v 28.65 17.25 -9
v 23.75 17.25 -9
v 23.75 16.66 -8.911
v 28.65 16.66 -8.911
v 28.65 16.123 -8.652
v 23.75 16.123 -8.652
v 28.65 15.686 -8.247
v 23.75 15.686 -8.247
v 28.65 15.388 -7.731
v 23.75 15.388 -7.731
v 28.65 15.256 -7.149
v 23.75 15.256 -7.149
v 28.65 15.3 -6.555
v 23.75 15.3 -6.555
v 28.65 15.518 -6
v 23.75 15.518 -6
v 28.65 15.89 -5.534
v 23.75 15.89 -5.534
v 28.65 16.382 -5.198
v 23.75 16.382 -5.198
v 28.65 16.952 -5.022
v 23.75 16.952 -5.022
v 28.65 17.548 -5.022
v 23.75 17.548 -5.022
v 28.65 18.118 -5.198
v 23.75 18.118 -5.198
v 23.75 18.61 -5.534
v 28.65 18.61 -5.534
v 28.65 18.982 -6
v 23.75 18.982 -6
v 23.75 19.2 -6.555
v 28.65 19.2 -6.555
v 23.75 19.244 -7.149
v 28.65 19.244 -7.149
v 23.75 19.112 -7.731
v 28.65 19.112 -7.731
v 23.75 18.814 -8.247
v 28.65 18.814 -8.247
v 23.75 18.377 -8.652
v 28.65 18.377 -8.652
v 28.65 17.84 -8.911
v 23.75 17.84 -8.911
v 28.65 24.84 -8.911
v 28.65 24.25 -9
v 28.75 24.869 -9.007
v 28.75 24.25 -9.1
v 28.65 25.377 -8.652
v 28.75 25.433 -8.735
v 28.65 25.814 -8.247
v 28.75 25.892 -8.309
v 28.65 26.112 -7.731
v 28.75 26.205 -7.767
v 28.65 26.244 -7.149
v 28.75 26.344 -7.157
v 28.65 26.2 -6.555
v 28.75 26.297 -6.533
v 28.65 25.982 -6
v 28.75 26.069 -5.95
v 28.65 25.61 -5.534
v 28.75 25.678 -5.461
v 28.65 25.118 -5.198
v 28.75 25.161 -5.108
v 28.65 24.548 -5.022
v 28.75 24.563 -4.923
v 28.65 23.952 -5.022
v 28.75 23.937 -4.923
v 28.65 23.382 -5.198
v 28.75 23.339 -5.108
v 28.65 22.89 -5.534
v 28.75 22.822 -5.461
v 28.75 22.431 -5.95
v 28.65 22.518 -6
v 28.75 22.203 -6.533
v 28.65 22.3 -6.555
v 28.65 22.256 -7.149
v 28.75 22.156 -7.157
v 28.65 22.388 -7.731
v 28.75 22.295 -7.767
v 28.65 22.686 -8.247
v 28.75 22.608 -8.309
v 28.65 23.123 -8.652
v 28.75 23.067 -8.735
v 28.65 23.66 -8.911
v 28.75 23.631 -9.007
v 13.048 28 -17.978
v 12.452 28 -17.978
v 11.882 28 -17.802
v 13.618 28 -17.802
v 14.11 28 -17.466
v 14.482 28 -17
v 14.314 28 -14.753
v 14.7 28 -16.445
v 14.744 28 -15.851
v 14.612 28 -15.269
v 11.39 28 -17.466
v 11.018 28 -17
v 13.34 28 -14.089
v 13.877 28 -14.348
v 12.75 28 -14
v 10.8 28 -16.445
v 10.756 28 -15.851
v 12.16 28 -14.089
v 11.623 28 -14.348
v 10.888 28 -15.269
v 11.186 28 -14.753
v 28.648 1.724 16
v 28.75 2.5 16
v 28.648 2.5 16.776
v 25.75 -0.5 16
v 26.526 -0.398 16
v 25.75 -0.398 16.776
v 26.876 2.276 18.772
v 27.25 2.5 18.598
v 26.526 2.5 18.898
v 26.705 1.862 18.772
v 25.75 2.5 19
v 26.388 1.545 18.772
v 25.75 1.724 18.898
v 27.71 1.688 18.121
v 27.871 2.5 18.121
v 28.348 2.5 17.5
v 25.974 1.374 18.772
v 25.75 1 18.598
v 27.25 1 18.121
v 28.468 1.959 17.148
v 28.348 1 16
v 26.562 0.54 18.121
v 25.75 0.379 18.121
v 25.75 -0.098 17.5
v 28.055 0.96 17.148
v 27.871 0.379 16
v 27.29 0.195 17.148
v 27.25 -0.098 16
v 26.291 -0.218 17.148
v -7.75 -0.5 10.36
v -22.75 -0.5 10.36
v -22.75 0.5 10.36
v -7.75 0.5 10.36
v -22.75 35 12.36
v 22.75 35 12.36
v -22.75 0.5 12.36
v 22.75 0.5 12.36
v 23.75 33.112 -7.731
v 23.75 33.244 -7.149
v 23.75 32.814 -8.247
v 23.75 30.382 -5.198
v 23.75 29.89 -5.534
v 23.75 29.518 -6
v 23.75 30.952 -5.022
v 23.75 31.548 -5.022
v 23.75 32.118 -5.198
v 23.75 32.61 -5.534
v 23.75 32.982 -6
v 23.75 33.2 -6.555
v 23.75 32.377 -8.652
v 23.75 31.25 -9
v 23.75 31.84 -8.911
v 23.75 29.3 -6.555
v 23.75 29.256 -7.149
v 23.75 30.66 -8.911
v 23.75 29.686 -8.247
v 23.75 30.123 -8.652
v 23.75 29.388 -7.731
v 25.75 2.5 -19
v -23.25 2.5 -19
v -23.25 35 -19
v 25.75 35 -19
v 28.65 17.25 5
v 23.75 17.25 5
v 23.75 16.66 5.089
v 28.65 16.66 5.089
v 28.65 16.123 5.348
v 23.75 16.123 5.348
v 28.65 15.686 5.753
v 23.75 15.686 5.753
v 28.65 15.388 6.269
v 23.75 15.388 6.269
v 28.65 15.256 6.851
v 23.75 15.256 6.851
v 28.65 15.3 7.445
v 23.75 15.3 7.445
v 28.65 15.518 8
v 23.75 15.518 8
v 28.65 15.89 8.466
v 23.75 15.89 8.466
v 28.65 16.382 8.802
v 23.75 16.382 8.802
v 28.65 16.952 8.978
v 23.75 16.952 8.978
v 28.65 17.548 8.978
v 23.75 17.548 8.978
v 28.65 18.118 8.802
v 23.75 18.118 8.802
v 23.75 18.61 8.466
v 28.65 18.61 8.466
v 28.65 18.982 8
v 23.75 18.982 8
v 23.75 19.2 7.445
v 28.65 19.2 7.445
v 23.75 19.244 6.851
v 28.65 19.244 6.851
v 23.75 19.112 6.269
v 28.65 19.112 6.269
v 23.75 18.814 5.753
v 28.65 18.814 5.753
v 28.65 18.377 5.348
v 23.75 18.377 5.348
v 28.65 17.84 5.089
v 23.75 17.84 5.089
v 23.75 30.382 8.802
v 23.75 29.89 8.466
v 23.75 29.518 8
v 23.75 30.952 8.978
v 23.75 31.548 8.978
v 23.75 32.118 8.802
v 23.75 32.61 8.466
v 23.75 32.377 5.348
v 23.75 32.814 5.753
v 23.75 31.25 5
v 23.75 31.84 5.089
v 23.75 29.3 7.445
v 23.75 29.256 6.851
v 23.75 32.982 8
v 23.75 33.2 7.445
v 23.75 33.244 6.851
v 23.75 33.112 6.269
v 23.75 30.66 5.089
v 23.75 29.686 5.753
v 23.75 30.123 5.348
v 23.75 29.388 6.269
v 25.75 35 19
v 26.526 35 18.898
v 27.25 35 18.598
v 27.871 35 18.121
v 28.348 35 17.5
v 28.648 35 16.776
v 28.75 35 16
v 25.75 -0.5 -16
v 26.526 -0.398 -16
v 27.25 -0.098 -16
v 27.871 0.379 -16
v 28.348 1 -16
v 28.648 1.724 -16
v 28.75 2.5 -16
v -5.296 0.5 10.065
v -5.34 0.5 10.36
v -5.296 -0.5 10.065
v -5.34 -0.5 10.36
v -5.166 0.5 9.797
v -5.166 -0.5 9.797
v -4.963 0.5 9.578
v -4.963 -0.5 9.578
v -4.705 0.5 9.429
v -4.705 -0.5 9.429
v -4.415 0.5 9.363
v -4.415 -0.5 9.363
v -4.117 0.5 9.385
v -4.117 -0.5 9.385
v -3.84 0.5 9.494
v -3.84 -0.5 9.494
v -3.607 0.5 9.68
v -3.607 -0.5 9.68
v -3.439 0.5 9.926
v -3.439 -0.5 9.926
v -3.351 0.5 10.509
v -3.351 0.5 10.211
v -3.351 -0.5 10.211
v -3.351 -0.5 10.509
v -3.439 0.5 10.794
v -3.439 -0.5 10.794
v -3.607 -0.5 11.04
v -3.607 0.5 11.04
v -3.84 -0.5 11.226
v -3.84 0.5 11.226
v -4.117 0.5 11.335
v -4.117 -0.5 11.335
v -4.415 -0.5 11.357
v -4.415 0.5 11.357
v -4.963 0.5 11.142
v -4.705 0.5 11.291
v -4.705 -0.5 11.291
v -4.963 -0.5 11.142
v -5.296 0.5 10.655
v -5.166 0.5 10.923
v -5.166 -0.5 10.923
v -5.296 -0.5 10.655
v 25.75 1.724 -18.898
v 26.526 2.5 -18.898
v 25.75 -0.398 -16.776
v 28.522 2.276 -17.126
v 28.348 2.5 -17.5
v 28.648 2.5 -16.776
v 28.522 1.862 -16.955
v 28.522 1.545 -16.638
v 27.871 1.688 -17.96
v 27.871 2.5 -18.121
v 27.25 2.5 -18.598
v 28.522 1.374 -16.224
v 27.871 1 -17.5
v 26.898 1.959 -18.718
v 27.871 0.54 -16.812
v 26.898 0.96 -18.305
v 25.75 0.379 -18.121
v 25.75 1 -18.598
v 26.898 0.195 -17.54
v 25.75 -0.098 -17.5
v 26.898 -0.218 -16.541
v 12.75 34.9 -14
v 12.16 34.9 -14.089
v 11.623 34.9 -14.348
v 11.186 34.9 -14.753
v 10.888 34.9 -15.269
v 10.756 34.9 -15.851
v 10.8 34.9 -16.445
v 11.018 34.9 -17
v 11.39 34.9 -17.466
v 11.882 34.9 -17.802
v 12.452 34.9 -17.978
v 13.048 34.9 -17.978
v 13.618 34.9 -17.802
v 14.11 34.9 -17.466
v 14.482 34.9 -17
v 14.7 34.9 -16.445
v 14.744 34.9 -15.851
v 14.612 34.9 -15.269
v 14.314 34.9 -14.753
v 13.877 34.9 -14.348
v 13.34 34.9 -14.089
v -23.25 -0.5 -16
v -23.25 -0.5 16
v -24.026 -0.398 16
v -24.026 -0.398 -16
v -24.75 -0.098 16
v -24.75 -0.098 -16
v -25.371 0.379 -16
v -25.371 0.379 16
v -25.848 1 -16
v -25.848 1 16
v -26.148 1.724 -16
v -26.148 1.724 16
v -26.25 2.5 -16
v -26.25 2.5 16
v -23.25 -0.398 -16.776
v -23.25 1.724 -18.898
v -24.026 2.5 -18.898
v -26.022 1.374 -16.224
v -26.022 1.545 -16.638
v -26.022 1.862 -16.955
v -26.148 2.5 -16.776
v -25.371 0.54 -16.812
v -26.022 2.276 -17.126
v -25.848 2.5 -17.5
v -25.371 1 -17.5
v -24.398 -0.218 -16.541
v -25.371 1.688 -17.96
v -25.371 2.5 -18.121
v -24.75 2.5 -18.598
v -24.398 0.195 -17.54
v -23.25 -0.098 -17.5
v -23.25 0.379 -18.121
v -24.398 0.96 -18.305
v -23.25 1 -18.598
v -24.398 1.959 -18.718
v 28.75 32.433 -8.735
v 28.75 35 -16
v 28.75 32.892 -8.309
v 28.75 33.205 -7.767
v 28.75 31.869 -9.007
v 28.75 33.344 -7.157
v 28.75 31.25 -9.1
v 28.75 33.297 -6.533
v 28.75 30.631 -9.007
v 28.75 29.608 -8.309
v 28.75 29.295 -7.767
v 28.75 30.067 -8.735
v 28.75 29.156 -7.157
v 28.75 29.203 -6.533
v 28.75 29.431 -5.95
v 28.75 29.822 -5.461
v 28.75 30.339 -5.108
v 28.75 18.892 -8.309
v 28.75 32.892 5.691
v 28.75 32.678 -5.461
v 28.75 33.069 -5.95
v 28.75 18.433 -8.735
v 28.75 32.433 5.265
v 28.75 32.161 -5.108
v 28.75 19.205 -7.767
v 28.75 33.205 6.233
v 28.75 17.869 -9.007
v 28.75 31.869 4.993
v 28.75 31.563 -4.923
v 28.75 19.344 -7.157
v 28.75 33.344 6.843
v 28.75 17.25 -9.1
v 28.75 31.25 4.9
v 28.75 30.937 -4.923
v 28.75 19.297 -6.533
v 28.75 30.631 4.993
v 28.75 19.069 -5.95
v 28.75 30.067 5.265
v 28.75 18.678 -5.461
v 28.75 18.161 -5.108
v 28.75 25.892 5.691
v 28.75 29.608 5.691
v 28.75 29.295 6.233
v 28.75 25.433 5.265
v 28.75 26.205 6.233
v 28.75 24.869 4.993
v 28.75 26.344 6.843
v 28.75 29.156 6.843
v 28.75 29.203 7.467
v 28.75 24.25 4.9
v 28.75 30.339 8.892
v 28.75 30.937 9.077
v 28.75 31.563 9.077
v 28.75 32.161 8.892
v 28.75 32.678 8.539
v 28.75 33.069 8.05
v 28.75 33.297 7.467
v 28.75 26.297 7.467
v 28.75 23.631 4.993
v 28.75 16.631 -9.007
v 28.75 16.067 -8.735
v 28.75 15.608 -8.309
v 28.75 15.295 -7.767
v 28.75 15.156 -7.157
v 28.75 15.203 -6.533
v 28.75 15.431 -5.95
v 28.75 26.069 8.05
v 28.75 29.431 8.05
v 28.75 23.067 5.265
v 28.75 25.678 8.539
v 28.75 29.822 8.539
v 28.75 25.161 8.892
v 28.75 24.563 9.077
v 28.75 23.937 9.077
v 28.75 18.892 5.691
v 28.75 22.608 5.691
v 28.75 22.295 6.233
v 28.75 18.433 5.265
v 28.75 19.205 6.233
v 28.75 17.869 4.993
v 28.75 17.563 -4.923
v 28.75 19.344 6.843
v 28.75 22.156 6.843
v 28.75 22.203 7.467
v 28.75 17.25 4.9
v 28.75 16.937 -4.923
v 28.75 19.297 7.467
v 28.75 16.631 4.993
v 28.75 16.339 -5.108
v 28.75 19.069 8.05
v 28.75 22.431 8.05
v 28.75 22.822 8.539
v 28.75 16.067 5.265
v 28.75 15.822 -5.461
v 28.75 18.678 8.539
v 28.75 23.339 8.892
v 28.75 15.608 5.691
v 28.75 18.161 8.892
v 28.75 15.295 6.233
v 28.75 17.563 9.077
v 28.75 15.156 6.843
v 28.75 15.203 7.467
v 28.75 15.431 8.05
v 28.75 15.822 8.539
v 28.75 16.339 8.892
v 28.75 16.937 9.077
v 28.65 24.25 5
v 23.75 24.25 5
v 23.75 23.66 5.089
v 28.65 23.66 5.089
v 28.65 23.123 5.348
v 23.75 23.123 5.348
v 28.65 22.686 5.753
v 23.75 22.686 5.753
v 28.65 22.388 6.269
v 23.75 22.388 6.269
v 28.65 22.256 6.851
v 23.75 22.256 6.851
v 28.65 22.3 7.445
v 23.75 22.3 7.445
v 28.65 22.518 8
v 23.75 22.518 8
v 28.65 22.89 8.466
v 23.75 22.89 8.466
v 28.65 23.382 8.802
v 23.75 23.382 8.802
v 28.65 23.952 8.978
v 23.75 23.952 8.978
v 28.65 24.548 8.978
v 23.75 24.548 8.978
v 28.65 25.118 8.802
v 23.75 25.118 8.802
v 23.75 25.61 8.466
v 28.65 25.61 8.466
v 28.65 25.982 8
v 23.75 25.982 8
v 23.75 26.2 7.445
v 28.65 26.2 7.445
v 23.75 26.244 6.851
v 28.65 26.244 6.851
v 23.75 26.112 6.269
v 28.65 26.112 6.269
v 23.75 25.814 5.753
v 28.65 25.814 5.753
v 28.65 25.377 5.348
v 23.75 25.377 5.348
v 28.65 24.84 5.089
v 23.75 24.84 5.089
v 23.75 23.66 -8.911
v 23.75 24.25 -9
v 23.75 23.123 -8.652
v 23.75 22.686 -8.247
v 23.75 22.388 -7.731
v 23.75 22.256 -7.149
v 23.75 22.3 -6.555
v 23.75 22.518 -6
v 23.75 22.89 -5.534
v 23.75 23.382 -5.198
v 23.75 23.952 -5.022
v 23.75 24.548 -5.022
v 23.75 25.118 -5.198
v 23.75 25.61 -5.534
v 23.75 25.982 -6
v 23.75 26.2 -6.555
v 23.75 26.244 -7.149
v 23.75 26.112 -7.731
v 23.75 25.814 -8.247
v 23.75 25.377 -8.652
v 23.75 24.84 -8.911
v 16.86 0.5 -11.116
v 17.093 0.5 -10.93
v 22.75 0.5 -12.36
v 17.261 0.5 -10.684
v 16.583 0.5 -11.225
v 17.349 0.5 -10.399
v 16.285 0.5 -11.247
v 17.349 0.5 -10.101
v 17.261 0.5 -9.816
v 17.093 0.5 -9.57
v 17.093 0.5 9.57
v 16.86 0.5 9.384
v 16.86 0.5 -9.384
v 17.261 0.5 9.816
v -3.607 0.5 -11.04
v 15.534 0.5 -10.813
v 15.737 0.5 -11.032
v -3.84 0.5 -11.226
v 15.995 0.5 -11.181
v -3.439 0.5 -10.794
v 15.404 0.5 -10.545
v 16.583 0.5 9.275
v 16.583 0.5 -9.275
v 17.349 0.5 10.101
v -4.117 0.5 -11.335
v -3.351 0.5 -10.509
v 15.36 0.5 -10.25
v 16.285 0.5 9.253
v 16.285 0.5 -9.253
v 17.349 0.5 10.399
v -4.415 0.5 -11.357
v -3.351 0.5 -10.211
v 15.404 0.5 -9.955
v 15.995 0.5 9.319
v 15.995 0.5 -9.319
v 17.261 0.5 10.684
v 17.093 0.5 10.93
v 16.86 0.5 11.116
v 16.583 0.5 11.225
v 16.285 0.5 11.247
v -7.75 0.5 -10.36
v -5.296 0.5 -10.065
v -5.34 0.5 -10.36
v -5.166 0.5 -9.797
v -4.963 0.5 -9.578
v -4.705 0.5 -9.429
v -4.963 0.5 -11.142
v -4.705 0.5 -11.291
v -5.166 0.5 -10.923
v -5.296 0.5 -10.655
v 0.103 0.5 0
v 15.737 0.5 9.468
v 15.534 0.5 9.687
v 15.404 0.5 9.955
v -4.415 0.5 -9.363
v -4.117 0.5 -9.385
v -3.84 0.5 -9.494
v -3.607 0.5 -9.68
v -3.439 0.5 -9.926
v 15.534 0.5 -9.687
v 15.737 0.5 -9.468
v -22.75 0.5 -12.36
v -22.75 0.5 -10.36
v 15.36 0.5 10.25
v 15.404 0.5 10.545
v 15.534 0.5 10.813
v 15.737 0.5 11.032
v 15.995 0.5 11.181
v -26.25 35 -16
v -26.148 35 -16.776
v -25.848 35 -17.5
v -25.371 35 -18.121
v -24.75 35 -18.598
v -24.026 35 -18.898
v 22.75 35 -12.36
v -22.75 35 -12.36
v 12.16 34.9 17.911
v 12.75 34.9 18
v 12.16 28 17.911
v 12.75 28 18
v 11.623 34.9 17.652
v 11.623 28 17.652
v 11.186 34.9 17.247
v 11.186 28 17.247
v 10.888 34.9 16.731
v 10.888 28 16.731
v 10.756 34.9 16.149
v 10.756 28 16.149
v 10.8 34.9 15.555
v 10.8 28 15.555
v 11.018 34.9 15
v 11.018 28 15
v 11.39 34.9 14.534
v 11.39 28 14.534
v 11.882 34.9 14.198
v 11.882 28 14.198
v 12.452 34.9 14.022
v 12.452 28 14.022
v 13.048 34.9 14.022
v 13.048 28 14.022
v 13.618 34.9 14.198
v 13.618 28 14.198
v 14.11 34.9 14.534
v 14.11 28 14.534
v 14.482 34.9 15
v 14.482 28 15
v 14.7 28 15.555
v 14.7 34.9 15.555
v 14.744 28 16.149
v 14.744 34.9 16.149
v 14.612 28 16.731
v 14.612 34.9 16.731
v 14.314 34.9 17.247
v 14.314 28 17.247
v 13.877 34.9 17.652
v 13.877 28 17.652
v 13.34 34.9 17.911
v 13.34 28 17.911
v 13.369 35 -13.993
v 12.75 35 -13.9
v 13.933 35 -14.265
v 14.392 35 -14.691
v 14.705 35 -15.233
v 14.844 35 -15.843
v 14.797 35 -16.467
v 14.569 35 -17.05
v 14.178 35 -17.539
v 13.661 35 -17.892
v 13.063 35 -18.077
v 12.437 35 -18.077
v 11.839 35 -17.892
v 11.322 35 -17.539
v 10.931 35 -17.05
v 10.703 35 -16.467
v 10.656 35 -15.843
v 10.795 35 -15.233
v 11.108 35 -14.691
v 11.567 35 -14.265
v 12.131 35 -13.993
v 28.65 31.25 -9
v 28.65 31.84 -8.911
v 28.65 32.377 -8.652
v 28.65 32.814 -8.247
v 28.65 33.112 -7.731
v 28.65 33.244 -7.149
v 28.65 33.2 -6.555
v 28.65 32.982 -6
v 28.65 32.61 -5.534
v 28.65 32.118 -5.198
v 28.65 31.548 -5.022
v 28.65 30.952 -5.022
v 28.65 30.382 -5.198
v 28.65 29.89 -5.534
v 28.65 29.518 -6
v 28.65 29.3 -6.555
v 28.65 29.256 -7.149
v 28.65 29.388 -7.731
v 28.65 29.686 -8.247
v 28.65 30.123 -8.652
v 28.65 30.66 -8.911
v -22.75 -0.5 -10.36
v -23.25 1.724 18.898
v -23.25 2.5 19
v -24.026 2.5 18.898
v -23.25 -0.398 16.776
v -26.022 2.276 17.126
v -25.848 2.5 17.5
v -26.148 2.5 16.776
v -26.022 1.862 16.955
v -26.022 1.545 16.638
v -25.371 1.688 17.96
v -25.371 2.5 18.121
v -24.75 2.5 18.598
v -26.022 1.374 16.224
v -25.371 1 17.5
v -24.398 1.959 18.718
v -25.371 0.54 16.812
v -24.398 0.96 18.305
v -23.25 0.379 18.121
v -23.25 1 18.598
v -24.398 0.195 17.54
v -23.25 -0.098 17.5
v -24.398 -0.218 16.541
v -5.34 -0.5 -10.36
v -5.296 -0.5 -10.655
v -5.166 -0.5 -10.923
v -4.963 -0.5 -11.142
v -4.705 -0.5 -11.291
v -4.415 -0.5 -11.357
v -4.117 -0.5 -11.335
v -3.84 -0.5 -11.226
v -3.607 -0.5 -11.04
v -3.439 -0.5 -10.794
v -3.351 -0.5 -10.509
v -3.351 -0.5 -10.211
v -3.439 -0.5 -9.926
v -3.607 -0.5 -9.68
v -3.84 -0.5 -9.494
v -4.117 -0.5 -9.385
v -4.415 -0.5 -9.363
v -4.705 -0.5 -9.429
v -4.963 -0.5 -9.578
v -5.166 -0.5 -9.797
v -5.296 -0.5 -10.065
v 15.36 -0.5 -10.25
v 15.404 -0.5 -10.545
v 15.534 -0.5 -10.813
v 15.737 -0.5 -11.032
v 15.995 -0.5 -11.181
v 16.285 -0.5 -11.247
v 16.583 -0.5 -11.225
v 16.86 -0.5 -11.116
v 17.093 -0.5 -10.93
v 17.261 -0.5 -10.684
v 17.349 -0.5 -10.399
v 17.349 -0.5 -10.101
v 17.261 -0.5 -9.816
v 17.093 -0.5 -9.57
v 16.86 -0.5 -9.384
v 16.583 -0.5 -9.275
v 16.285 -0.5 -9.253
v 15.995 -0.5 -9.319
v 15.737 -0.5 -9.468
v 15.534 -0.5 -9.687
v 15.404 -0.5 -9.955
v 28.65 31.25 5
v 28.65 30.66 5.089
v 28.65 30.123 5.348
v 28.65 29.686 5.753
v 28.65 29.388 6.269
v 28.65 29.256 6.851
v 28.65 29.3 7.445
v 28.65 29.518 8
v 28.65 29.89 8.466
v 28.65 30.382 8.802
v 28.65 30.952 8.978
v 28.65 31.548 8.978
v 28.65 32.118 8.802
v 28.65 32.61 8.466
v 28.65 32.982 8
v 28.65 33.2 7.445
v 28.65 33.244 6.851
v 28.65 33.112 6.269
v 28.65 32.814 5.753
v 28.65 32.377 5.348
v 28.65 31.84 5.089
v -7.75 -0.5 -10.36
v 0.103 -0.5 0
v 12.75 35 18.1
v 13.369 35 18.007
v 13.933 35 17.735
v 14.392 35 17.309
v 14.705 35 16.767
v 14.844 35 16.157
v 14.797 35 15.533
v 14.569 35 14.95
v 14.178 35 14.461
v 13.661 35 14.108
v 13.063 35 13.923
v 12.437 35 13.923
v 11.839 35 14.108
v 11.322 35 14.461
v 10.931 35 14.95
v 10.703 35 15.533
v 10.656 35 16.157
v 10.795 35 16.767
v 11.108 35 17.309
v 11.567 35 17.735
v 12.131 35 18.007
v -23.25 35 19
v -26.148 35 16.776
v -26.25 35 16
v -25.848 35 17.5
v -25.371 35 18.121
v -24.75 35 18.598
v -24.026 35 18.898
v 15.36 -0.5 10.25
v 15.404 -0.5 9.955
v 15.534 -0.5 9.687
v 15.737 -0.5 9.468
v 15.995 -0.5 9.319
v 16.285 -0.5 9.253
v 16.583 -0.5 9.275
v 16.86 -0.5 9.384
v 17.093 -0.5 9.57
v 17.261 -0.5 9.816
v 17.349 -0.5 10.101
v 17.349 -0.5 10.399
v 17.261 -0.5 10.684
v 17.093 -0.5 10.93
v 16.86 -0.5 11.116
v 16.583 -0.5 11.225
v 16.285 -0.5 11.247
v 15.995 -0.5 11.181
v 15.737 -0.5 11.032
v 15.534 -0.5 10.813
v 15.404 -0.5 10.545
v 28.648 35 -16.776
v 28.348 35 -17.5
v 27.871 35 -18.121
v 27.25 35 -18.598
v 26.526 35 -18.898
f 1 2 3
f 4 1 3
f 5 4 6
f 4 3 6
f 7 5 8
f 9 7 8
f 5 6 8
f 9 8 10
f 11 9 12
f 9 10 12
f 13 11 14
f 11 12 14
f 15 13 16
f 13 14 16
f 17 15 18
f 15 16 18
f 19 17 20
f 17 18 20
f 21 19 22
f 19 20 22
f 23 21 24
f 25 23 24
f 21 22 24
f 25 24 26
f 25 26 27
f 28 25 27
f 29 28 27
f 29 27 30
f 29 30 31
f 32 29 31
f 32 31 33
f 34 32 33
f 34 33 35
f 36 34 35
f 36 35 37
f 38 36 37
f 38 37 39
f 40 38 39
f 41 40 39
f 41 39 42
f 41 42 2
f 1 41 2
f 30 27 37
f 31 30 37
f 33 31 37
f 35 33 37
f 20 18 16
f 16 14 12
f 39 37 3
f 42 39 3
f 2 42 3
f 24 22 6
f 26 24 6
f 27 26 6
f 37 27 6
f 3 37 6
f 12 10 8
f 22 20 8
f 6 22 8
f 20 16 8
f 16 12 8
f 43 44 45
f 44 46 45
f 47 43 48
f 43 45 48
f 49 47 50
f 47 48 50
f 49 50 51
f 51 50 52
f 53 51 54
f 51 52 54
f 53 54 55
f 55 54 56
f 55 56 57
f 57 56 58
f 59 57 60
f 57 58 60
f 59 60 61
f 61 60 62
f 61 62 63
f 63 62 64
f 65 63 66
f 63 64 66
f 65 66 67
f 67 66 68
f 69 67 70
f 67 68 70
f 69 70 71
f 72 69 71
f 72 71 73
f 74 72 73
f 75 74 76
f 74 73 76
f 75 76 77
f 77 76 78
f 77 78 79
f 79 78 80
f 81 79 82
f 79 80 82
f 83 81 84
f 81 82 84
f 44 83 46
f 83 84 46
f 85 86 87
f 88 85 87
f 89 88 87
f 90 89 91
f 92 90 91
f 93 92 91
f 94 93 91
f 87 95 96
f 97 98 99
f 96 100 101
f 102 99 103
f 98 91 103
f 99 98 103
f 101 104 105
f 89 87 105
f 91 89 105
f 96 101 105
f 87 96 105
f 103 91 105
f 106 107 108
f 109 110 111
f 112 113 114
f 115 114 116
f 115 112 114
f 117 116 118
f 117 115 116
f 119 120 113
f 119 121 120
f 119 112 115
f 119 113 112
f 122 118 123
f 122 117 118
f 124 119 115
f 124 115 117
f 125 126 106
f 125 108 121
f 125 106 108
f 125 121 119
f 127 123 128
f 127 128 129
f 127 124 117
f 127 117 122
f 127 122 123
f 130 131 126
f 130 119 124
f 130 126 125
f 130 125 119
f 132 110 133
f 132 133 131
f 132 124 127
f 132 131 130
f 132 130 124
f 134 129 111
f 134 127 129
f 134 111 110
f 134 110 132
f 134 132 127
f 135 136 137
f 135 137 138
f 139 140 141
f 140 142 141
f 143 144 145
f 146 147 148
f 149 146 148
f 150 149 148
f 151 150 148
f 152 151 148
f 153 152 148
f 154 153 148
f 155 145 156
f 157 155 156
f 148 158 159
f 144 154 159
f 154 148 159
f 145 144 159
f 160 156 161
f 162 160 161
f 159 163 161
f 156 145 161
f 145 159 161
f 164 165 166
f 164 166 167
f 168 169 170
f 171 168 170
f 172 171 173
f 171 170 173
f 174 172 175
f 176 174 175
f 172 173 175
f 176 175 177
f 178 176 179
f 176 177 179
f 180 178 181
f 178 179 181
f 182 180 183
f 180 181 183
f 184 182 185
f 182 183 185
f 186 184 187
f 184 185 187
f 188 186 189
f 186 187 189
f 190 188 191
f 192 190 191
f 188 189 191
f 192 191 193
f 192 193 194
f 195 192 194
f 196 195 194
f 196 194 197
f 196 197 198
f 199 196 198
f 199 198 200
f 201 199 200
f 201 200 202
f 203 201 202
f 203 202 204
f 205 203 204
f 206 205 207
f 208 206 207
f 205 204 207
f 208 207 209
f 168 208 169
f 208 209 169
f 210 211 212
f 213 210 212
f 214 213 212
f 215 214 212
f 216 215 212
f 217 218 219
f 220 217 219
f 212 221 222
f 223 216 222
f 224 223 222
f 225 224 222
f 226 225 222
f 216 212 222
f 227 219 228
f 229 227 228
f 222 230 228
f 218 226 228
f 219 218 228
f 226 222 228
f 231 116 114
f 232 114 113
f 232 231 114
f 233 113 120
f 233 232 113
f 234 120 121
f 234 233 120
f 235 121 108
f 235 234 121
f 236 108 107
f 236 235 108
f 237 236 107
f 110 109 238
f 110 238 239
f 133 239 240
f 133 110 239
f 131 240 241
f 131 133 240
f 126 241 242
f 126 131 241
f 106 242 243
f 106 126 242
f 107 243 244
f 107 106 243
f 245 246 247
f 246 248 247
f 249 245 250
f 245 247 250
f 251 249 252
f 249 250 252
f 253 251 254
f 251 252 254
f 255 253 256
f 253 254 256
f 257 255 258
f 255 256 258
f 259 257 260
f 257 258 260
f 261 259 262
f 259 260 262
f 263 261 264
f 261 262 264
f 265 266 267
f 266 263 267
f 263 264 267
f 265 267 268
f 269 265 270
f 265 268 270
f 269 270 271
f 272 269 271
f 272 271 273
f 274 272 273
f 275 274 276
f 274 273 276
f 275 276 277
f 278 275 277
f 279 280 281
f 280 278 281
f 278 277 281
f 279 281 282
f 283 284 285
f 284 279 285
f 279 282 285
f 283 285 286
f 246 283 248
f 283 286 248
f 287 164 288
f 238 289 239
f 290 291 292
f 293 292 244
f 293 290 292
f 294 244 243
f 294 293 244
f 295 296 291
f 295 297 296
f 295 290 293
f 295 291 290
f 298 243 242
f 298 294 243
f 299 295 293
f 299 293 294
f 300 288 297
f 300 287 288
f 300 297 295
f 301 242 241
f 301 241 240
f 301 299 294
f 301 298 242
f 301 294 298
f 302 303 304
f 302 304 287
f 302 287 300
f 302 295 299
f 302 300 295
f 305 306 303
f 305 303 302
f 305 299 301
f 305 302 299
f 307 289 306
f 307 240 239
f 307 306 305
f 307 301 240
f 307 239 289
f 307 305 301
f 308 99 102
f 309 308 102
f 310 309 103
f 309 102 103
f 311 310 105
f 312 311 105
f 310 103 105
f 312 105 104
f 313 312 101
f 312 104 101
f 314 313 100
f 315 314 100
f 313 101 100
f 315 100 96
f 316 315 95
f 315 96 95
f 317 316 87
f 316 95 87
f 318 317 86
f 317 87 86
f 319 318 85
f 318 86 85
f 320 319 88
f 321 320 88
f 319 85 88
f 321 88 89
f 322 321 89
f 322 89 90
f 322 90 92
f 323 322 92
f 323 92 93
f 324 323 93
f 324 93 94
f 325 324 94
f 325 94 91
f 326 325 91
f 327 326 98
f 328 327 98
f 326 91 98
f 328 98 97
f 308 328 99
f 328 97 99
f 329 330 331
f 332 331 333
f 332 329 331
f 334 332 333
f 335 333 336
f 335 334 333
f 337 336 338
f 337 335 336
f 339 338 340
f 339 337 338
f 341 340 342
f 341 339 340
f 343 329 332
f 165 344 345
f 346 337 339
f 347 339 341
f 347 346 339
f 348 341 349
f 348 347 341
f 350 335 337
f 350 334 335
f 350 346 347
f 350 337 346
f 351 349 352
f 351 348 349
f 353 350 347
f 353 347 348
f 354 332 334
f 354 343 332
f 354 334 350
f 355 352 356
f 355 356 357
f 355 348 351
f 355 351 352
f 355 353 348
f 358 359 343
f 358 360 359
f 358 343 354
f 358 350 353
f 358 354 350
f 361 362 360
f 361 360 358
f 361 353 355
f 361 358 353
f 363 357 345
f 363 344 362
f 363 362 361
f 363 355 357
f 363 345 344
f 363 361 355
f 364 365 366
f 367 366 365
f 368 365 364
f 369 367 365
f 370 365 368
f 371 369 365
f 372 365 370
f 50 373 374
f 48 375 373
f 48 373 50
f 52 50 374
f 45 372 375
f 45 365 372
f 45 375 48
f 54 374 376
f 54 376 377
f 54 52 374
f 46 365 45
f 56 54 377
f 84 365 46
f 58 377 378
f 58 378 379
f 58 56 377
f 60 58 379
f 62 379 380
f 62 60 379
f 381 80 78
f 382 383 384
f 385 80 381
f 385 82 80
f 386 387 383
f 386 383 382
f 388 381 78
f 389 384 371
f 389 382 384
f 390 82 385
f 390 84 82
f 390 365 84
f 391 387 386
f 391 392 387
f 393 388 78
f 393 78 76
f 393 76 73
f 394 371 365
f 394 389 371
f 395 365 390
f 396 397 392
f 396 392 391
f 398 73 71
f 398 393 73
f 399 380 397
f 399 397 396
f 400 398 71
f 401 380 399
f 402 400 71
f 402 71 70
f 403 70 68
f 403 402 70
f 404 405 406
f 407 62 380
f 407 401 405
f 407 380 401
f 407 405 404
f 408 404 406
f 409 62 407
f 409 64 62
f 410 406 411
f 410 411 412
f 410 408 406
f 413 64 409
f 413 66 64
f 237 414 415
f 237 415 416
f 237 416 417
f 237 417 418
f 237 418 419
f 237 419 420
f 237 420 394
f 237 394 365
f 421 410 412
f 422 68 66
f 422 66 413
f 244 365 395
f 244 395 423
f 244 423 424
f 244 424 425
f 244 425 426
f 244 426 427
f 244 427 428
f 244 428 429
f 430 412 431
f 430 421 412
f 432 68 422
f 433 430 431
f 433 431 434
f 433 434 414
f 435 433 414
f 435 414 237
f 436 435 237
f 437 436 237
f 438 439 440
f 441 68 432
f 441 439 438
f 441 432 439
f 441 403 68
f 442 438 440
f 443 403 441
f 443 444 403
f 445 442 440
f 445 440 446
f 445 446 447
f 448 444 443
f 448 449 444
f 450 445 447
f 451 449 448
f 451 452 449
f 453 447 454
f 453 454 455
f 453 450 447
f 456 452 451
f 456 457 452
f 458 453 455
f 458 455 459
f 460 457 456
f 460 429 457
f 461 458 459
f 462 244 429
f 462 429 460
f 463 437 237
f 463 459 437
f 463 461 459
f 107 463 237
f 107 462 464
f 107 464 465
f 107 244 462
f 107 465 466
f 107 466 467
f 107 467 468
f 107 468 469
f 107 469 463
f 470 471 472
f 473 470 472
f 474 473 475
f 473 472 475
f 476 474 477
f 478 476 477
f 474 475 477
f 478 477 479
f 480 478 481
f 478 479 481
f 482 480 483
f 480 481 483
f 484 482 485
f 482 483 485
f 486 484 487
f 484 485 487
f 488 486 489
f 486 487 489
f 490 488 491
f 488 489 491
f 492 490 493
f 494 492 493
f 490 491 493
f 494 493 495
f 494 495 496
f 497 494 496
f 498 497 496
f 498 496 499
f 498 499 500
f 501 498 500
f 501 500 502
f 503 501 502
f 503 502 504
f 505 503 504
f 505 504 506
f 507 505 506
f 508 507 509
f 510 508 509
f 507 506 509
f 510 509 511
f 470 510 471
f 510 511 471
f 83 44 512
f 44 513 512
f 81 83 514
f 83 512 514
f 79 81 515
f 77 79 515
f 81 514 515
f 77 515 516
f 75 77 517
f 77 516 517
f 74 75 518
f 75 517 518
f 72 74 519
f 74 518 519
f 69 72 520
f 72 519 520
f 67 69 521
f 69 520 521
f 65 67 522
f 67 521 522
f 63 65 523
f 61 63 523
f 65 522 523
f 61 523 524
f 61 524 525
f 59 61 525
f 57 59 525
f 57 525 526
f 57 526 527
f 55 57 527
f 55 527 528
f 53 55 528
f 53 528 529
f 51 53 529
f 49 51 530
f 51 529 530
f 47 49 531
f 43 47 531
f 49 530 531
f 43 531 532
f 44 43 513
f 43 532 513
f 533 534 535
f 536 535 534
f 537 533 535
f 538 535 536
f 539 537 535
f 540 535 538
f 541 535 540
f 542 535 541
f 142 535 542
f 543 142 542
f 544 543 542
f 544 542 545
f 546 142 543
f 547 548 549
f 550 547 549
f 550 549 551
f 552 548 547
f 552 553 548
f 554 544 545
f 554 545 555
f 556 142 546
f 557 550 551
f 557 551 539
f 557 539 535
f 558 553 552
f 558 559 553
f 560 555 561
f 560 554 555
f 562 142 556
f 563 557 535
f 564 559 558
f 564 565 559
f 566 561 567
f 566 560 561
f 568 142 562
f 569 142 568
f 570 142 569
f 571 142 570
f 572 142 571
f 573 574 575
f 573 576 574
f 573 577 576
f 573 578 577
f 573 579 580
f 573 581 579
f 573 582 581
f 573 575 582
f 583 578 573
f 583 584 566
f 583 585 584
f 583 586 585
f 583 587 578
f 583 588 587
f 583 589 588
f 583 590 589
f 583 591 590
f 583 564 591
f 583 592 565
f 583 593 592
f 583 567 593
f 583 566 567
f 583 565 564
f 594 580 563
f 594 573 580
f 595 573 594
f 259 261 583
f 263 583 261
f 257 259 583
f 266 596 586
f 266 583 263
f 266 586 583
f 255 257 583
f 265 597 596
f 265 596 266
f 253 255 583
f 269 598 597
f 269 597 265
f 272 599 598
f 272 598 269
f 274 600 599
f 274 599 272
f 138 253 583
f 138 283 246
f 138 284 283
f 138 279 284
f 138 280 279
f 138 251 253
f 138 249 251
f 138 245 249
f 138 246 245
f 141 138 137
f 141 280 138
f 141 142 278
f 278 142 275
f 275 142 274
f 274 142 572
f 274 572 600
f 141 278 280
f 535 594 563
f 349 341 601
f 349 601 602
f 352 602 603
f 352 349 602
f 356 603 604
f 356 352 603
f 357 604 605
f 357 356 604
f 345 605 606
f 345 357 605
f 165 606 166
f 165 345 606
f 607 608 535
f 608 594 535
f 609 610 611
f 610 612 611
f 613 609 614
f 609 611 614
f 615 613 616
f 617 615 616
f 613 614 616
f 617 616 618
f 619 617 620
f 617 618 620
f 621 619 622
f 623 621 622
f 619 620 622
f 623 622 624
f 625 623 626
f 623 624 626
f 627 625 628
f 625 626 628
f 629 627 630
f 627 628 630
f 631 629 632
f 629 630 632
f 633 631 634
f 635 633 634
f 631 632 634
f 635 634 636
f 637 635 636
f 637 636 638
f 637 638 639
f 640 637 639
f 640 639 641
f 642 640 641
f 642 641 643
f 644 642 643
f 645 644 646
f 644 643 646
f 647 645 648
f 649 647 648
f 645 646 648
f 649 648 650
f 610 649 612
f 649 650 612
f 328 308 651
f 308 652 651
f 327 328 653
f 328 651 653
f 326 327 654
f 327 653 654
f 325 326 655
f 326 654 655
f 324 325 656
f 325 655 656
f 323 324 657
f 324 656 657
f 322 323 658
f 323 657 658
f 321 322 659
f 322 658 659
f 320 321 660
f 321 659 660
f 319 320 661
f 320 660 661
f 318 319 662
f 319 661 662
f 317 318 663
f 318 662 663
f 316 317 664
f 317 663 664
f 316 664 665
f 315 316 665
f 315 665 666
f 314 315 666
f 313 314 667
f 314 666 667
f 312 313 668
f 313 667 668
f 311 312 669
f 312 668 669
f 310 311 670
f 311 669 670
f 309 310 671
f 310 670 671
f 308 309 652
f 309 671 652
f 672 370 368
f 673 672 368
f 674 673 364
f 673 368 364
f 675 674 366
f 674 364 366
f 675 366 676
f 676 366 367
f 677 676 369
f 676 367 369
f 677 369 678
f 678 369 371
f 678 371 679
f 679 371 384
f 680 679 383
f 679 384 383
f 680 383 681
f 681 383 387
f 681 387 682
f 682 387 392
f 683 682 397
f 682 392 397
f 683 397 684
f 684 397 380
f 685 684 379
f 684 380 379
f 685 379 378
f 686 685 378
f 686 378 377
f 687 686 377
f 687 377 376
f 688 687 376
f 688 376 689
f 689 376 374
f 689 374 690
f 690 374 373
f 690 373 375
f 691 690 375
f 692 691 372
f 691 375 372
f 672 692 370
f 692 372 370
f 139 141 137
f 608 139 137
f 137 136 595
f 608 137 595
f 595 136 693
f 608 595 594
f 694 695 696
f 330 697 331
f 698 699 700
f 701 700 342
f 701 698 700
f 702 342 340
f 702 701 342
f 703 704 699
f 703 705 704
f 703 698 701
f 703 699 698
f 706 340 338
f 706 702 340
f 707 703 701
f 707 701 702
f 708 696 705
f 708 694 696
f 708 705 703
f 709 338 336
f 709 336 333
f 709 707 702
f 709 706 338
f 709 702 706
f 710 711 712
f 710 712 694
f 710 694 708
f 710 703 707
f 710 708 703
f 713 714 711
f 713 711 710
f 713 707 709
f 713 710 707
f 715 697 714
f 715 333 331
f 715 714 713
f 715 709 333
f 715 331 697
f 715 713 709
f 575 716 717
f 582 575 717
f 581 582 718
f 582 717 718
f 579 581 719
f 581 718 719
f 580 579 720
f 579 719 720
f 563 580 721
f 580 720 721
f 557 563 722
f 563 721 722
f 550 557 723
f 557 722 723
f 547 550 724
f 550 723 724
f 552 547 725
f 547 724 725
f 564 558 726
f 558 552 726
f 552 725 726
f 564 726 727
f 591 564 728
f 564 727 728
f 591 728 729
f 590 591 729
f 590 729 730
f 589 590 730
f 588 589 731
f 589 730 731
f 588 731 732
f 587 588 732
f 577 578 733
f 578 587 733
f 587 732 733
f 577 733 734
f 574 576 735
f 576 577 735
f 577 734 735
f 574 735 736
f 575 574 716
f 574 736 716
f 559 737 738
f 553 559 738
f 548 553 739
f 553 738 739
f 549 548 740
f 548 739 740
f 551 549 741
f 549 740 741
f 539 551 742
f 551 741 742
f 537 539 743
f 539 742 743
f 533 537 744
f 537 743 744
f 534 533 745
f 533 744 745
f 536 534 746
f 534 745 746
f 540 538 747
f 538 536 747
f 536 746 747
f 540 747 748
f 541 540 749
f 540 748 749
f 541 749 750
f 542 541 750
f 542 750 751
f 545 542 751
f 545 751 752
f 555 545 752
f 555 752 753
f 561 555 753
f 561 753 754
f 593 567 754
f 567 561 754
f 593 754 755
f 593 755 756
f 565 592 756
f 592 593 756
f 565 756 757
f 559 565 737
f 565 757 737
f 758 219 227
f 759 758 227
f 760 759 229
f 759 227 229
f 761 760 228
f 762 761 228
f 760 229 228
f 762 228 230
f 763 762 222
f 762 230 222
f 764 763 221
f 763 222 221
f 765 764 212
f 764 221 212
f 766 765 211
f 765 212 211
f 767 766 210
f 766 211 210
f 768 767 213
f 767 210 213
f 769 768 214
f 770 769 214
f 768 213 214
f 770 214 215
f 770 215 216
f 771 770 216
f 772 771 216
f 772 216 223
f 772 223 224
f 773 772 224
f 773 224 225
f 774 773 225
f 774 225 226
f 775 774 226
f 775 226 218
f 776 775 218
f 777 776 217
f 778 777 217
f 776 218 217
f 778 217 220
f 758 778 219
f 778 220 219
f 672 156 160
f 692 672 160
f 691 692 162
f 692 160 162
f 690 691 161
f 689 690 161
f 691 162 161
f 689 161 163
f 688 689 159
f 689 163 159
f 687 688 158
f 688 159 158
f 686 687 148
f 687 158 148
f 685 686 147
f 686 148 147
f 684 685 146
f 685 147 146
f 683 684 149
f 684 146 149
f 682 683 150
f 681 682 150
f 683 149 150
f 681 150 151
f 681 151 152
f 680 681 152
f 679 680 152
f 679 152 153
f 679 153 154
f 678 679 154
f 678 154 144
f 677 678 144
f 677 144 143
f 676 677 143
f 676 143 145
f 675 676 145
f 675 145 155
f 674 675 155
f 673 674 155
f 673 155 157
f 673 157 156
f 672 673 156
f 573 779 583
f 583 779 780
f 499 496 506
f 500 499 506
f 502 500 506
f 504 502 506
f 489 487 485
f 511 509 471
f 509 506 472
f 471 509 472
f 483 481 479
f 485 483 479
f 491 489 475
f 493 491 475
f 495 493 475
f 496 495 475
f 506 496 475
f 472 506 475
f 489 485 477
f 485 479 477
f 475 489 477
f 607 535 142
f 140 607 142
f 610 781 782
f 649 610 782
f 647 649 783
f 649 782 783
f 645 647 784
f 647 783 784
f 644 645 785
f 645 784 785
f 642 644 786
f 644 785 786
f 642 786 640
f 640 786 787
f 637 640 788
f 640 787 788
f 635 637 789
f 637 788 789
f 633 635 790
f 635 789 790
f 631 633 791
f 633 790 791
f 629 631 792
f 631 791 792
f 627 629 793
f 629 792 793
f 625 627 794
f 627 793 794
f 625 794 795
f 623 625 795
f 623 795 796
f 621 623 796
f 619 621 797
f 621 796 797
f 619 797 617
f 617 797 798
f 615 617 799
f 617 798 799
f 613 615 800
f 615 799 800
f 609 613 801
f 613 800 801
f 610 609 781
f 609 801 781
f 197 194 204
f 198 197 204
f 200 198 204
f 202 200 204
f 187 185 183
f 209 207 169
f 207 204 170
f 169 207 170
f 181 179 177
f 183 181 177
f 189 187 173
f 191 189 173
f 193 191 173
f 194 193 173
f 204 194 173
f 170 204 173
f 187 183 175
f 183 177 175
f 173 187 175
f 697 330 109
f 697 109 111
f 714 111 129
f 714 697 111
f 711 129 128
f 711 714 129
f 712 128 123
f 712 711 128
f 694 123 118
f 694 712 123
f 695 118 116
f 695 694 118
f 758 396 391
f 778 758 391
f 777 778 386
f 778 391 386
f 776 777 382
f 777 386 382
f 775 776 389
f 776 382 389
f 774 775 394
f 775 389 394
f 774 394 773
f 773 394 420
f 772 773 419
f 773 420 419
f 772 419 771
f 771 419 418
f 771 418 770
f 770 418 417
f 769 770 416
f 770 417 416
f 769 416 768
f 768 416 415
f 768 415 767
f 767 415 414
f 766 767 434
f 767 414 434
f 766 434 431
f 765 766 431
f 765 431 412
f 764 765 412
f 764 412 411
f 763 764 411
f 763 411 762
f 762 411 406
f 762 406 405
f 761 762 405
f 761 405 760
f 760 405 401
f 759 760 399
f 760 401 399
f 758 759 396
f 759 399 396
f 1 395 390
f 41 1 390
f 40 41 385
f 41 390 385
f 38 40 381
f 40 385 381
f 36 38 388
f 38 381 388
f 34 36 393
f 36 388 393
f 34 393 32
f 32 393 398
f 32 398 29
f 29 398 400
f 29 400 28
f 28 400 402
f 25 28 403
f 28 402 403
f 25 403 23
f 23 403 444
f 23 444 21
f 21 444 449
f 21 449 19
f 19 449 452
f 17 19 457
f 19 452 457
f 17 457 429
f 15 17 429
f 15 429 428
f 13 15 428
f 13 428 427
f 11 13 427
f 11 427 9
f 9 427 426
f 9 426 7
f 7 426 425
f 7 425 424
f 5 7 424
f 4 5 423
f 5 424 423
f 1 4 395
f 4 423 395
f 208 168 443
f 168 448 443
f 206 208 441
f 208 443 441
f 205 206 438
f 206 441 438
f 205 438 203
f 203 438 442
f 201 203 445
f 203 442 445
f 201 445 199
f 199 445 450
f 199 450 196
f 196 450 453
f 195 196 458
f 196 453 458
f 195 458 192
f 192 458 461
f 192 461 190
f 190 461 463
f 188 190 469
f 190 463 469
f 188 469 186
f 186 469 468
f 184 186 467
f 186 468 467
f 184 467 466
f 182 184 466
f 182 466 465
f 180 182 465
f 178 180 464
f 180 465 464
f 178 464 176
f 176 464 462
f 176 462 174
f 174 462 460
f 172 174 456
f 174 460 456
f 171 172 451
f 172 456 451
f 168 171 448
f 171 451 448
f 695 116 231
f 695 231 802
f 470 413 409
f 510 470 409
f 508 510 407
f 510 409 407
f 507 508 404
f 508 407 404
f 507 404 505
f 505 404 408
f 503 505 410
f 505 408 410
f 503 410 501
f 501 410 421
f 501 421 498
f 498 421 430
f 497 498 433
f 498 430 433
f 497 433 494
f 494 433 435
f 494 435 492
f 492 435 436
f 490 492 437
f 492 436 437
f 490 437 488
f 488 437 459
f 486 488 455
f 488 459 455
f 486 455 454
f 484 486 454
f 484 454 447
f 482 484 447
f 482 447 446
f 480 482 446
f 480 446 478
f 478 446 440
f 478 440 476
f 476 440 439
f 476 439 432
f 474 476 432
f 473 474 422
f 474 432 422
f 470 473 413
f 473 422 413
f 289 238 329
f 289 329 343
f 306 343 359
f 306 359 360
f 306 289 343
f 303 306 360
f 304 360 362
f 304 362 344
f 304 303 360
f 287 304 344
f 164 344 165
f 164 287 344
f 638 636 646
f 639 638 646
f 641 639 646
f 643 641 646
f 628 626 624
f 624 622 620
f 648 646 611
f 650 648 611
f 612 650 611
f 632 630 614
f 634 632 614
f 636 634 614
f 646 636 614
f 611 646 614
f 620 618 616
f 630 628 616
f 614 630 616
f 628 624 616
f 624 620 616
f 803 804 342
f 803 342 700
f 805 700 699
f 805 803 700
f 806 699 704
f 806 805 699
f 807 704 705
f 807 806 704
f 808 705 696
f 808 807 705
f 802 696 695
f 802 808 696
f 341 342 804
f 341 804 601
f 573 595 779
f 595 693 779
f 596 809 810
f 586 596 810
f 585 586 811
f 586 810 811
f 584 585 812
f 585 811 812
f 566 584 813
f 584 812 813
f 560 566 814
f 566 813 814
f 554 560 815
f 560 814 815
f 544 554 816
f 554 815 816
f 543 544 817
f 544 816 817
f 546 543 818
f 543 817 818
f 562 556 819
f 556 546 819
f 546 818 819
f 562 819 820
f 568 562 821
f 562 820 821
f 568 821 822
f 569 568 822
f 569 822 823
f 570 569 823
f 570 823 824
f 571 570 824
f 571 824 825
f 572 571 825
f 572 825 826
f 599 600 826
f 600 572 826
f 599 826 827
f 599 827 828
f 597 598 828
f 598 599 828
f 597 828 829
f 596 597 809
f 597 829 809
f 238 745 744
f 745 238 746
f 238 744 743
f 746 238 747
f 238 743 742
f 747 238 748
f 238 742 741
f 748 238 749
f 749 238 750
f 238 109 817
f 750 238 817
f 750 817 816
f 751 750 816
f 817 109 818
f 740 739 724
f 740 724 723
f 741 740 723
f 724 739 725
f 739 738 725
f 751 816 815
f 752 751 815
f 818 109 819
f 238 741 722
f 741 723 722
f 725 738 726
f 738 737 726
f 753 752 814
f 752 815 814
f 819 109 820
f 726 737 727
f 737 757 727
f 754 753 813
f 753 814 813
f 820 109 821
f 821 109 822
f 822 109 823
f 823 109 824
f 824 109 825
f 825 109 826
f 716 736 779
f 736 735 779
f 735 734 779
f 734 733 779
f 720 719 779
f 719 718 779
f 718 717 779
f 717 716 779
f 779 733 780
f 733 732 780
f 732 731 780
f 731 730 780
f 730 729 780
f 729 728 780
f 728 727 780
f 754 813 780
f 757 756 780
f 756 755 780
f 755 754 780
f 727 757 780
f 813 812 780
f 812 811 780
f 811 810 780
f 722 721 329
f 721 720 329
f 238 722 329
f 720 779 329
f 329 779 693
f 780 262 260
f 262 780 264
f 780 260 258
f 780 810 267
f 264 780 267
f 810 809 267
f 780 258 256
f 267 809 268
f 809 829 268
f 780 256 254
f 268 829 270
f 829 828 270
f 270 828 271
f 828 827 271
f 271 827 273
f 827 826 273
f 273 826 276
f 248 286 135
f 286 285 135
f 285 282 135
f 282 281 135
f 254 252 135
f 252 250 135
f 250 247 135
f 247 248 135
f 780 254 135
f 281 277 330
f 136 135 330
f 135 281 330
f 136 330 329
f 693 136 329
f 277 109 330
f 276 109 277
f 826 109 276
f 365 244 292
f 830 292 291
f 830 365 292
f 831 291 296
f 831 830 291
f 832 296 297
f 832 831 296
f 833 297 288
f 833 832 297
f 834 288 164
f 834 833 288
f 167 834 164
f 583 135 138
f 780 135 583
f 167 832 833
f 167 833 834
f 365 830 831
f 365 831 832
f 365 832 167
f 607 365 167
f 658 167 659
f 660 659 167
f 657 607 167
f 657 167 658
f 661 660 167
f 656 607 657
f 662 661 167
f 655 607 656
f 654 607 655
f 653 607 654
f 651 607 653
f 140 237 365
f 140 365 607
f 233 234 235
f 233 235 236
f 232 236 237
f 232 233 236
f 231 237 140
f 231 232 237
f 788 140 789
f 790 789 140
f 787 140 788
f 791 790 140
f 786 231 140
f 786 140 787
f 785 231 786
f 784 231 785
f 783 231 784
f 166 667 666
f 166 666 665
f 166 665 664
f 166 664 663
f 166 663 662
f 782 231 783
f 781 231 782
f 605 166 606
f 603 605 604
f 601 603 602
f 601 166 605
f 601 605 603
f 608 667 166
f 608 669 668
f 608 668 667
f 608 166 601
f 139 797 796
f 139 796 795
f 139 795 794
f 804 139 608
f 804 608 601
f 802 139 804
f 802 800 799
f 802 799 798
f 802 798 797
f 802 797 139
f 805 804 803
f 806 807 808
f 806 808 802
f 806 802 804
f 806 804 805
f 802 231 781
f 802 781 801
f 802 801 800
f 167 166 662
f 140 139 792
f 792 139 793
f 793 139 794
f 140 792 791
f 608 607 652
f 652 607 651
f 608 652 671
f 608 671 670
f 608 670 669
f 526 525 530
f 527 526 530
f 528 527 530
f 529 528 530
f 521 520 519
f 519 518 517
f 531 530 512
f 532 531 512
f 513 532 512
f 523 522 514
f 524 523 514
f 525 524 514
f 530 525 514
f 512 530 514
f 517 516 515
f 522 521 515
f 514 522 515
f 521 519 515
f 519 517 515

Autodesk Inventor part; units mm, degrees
ref_plane "YZ Plane" through (0, 0, 0) normal (1, 0, 0) x (0, 1, 0)
ref_plane "XZ Plane" through (0, 0, 0) normal (0, 1, 0) x (-1, 0, 0)
ref_plane "XY Plane" through (0, 0, 0) normal (0, 0, 1) x (1, 0, 0)
sketch "Sketch1" plane through (0, 0, 0) normal (0, 1, 0) x (-1, 0, 0)
  line L0 (22.75, -10.36) -> (7.75, -10.36)
  line L1 (7.75, -10.36) -> (-0.1031, 0)
  circle A0 centre (4.34, -10.36) radius 1
  line L2 (22.75, 10.36) -> (7.75, 10.36)
  circle A1 centre (12.64, 0) radius 9.6 construction
  line L3 (22.75, 12.36) -> (22.75, -12.36)
  circle A2 centre (4.34, 10.36) radius 1
  line L4 (7.75, 10.36) -> (-0.1031, 0)
  line L5 (26.25, 19) -> (26.25, -19)
  line L6 (22.75, -12.36) -> (-22.75, -12.36)
  line L7 (22.75, 0) -> (-22.75, 0) construction
  line L8 (26.25, -19) -> (-28.75, -19)
  line L9 (26.25, -19) -> (-28.75, 19) construction
  line L10 (-28.75, -19) -> (26.25, 19) construction
  line L11 (-22.75, 12.36) -> (22.75, 12.36)
  line L12 (-28.75, 19) -> (26.25, 19)
  line L13 (-28.75, -19) -> (-28.75, 19)
  circle A3 centre (-16.36, 10.25) radius 1
  line L14 (-22.75, -12.36) -> (-22.75, 12.36)
  circle A4 centre (-16.36, -10.25) radius 1
  point P0 (0, 0)
  point P1 (-1.25, 0)
  point P2 (0, 0)
  point P3 (22.75, -10.36)
  dimension "d0" = 55
  dimension "d1" = 38
  dimension "d2" = 45.5
  dimension "d3" = 24.72
  dimension "d4" = 2
  dimension "d6" = 18.41
  dimension "d7" = 20.5
  dimension "d8" = 19.2
  dimension "d9" = 10.11
  dimension "d10" = 13
  dimension "d11" = 15
  dimension "d12" = 3.5
  dimension "d13" = 2
  dimension "d68" = 3.41
  dimension "d69" = 20.7
extrude "Extrusion1" add sketch "Sketch1" along normal mid plane 1 contours L3 L6 L14 L11 L2 L4 L1 L0 | L5 L8 L13 L12
extrude "Extrusion2" add sketch "Sketch1" along normal blind 35 contours L5 L8 L13 L12
fillet "Fillet1" radius 3 8 edges at (1.25, -0.5, -19) (28.75, -0.5, 0) (1.25, -0.5, 19) (-26.25, -0.5, 0) (28.75, 17.25, -19) (28.75, 17.25, 19) (-26.25, 17.25, 19) (-26.25, 17.25, -19)
sketch "Sketch6" plane through (28.75, 2.5, 16) normal (1, 0, 0) x (0, 0, -1)
  circle A0 centre (23, 14.75) radius 1.5
  line L0 (0, 32.5) -> (32, 32.5) projected
  line L1 (16, 32.5) -> (16, 0)
  line L2 (32, 0) -> (0, 0) projected
  line L3 (16, 39.5) -> (16, 7)
  circle A1 centre (23, 21.75) radius 1.5
  line L4 (16, 46.5) -> (16, 14)
  circle A2 centre (23, 28.75) radius 1.5
  line L5 (2, 32.5) -> (2, 0)
  circle A3 centre (9, 14.75) radius 1.5
  line L6 (2, 39.5) -> (2, 7)
  circle A4 centre (9, 21.75) radius 1.5
  line L7 (2, 46.5) -> (2, 14)
  circle A5 centre (9, 28.75) radius 1.5
  point P0 (16, -2.5)
  dimension "d50" = 3
  dimension "d54" = 7
  dimension "d57" = 14
  dimension "d70" = 3.75
hole "Hole2" at (28.75, 31.25, 7) at (28.75, 31.25, -7) at (28.75, 24.25, -7) at (28.75, 24.25, 7) at (28.75, 17.25, 7) at (28.75, 17.25, -7) direction (-1, 0, 0) diameter 4 depth 5 countersink diameter 4.2 countersink angle 90
sketch "Sketch7" plane through (0, 35, 0) normal (0, 1, 0) x (1, 0, 0)
  line L0 (-26.25, 16) -> (-26.25, -16) projected
  line L1 (-26.25, 0) -> (28.75, 0)
  line L2 (28.75, -16) -> (28.75, 16) projected
  line L3 (-23.25, -16) -> (25.75, -16) projected
  circle A0 centre (12.75, -16) radius 1.5
  circle A1 centre (12.75, 16) radius 1.5
  point P0 (0, 0)
  dimension "d71" = 3
  dimension "d72" = 16
hole "Hole3" at (12.75, 35, 16) at (12.75, 35, -16) direction (0, -1, 0) diameter 4 depth 7 countersink diameter 4.2 countersink angle 90
properties part number "basketback" material "PCTG 20%"
